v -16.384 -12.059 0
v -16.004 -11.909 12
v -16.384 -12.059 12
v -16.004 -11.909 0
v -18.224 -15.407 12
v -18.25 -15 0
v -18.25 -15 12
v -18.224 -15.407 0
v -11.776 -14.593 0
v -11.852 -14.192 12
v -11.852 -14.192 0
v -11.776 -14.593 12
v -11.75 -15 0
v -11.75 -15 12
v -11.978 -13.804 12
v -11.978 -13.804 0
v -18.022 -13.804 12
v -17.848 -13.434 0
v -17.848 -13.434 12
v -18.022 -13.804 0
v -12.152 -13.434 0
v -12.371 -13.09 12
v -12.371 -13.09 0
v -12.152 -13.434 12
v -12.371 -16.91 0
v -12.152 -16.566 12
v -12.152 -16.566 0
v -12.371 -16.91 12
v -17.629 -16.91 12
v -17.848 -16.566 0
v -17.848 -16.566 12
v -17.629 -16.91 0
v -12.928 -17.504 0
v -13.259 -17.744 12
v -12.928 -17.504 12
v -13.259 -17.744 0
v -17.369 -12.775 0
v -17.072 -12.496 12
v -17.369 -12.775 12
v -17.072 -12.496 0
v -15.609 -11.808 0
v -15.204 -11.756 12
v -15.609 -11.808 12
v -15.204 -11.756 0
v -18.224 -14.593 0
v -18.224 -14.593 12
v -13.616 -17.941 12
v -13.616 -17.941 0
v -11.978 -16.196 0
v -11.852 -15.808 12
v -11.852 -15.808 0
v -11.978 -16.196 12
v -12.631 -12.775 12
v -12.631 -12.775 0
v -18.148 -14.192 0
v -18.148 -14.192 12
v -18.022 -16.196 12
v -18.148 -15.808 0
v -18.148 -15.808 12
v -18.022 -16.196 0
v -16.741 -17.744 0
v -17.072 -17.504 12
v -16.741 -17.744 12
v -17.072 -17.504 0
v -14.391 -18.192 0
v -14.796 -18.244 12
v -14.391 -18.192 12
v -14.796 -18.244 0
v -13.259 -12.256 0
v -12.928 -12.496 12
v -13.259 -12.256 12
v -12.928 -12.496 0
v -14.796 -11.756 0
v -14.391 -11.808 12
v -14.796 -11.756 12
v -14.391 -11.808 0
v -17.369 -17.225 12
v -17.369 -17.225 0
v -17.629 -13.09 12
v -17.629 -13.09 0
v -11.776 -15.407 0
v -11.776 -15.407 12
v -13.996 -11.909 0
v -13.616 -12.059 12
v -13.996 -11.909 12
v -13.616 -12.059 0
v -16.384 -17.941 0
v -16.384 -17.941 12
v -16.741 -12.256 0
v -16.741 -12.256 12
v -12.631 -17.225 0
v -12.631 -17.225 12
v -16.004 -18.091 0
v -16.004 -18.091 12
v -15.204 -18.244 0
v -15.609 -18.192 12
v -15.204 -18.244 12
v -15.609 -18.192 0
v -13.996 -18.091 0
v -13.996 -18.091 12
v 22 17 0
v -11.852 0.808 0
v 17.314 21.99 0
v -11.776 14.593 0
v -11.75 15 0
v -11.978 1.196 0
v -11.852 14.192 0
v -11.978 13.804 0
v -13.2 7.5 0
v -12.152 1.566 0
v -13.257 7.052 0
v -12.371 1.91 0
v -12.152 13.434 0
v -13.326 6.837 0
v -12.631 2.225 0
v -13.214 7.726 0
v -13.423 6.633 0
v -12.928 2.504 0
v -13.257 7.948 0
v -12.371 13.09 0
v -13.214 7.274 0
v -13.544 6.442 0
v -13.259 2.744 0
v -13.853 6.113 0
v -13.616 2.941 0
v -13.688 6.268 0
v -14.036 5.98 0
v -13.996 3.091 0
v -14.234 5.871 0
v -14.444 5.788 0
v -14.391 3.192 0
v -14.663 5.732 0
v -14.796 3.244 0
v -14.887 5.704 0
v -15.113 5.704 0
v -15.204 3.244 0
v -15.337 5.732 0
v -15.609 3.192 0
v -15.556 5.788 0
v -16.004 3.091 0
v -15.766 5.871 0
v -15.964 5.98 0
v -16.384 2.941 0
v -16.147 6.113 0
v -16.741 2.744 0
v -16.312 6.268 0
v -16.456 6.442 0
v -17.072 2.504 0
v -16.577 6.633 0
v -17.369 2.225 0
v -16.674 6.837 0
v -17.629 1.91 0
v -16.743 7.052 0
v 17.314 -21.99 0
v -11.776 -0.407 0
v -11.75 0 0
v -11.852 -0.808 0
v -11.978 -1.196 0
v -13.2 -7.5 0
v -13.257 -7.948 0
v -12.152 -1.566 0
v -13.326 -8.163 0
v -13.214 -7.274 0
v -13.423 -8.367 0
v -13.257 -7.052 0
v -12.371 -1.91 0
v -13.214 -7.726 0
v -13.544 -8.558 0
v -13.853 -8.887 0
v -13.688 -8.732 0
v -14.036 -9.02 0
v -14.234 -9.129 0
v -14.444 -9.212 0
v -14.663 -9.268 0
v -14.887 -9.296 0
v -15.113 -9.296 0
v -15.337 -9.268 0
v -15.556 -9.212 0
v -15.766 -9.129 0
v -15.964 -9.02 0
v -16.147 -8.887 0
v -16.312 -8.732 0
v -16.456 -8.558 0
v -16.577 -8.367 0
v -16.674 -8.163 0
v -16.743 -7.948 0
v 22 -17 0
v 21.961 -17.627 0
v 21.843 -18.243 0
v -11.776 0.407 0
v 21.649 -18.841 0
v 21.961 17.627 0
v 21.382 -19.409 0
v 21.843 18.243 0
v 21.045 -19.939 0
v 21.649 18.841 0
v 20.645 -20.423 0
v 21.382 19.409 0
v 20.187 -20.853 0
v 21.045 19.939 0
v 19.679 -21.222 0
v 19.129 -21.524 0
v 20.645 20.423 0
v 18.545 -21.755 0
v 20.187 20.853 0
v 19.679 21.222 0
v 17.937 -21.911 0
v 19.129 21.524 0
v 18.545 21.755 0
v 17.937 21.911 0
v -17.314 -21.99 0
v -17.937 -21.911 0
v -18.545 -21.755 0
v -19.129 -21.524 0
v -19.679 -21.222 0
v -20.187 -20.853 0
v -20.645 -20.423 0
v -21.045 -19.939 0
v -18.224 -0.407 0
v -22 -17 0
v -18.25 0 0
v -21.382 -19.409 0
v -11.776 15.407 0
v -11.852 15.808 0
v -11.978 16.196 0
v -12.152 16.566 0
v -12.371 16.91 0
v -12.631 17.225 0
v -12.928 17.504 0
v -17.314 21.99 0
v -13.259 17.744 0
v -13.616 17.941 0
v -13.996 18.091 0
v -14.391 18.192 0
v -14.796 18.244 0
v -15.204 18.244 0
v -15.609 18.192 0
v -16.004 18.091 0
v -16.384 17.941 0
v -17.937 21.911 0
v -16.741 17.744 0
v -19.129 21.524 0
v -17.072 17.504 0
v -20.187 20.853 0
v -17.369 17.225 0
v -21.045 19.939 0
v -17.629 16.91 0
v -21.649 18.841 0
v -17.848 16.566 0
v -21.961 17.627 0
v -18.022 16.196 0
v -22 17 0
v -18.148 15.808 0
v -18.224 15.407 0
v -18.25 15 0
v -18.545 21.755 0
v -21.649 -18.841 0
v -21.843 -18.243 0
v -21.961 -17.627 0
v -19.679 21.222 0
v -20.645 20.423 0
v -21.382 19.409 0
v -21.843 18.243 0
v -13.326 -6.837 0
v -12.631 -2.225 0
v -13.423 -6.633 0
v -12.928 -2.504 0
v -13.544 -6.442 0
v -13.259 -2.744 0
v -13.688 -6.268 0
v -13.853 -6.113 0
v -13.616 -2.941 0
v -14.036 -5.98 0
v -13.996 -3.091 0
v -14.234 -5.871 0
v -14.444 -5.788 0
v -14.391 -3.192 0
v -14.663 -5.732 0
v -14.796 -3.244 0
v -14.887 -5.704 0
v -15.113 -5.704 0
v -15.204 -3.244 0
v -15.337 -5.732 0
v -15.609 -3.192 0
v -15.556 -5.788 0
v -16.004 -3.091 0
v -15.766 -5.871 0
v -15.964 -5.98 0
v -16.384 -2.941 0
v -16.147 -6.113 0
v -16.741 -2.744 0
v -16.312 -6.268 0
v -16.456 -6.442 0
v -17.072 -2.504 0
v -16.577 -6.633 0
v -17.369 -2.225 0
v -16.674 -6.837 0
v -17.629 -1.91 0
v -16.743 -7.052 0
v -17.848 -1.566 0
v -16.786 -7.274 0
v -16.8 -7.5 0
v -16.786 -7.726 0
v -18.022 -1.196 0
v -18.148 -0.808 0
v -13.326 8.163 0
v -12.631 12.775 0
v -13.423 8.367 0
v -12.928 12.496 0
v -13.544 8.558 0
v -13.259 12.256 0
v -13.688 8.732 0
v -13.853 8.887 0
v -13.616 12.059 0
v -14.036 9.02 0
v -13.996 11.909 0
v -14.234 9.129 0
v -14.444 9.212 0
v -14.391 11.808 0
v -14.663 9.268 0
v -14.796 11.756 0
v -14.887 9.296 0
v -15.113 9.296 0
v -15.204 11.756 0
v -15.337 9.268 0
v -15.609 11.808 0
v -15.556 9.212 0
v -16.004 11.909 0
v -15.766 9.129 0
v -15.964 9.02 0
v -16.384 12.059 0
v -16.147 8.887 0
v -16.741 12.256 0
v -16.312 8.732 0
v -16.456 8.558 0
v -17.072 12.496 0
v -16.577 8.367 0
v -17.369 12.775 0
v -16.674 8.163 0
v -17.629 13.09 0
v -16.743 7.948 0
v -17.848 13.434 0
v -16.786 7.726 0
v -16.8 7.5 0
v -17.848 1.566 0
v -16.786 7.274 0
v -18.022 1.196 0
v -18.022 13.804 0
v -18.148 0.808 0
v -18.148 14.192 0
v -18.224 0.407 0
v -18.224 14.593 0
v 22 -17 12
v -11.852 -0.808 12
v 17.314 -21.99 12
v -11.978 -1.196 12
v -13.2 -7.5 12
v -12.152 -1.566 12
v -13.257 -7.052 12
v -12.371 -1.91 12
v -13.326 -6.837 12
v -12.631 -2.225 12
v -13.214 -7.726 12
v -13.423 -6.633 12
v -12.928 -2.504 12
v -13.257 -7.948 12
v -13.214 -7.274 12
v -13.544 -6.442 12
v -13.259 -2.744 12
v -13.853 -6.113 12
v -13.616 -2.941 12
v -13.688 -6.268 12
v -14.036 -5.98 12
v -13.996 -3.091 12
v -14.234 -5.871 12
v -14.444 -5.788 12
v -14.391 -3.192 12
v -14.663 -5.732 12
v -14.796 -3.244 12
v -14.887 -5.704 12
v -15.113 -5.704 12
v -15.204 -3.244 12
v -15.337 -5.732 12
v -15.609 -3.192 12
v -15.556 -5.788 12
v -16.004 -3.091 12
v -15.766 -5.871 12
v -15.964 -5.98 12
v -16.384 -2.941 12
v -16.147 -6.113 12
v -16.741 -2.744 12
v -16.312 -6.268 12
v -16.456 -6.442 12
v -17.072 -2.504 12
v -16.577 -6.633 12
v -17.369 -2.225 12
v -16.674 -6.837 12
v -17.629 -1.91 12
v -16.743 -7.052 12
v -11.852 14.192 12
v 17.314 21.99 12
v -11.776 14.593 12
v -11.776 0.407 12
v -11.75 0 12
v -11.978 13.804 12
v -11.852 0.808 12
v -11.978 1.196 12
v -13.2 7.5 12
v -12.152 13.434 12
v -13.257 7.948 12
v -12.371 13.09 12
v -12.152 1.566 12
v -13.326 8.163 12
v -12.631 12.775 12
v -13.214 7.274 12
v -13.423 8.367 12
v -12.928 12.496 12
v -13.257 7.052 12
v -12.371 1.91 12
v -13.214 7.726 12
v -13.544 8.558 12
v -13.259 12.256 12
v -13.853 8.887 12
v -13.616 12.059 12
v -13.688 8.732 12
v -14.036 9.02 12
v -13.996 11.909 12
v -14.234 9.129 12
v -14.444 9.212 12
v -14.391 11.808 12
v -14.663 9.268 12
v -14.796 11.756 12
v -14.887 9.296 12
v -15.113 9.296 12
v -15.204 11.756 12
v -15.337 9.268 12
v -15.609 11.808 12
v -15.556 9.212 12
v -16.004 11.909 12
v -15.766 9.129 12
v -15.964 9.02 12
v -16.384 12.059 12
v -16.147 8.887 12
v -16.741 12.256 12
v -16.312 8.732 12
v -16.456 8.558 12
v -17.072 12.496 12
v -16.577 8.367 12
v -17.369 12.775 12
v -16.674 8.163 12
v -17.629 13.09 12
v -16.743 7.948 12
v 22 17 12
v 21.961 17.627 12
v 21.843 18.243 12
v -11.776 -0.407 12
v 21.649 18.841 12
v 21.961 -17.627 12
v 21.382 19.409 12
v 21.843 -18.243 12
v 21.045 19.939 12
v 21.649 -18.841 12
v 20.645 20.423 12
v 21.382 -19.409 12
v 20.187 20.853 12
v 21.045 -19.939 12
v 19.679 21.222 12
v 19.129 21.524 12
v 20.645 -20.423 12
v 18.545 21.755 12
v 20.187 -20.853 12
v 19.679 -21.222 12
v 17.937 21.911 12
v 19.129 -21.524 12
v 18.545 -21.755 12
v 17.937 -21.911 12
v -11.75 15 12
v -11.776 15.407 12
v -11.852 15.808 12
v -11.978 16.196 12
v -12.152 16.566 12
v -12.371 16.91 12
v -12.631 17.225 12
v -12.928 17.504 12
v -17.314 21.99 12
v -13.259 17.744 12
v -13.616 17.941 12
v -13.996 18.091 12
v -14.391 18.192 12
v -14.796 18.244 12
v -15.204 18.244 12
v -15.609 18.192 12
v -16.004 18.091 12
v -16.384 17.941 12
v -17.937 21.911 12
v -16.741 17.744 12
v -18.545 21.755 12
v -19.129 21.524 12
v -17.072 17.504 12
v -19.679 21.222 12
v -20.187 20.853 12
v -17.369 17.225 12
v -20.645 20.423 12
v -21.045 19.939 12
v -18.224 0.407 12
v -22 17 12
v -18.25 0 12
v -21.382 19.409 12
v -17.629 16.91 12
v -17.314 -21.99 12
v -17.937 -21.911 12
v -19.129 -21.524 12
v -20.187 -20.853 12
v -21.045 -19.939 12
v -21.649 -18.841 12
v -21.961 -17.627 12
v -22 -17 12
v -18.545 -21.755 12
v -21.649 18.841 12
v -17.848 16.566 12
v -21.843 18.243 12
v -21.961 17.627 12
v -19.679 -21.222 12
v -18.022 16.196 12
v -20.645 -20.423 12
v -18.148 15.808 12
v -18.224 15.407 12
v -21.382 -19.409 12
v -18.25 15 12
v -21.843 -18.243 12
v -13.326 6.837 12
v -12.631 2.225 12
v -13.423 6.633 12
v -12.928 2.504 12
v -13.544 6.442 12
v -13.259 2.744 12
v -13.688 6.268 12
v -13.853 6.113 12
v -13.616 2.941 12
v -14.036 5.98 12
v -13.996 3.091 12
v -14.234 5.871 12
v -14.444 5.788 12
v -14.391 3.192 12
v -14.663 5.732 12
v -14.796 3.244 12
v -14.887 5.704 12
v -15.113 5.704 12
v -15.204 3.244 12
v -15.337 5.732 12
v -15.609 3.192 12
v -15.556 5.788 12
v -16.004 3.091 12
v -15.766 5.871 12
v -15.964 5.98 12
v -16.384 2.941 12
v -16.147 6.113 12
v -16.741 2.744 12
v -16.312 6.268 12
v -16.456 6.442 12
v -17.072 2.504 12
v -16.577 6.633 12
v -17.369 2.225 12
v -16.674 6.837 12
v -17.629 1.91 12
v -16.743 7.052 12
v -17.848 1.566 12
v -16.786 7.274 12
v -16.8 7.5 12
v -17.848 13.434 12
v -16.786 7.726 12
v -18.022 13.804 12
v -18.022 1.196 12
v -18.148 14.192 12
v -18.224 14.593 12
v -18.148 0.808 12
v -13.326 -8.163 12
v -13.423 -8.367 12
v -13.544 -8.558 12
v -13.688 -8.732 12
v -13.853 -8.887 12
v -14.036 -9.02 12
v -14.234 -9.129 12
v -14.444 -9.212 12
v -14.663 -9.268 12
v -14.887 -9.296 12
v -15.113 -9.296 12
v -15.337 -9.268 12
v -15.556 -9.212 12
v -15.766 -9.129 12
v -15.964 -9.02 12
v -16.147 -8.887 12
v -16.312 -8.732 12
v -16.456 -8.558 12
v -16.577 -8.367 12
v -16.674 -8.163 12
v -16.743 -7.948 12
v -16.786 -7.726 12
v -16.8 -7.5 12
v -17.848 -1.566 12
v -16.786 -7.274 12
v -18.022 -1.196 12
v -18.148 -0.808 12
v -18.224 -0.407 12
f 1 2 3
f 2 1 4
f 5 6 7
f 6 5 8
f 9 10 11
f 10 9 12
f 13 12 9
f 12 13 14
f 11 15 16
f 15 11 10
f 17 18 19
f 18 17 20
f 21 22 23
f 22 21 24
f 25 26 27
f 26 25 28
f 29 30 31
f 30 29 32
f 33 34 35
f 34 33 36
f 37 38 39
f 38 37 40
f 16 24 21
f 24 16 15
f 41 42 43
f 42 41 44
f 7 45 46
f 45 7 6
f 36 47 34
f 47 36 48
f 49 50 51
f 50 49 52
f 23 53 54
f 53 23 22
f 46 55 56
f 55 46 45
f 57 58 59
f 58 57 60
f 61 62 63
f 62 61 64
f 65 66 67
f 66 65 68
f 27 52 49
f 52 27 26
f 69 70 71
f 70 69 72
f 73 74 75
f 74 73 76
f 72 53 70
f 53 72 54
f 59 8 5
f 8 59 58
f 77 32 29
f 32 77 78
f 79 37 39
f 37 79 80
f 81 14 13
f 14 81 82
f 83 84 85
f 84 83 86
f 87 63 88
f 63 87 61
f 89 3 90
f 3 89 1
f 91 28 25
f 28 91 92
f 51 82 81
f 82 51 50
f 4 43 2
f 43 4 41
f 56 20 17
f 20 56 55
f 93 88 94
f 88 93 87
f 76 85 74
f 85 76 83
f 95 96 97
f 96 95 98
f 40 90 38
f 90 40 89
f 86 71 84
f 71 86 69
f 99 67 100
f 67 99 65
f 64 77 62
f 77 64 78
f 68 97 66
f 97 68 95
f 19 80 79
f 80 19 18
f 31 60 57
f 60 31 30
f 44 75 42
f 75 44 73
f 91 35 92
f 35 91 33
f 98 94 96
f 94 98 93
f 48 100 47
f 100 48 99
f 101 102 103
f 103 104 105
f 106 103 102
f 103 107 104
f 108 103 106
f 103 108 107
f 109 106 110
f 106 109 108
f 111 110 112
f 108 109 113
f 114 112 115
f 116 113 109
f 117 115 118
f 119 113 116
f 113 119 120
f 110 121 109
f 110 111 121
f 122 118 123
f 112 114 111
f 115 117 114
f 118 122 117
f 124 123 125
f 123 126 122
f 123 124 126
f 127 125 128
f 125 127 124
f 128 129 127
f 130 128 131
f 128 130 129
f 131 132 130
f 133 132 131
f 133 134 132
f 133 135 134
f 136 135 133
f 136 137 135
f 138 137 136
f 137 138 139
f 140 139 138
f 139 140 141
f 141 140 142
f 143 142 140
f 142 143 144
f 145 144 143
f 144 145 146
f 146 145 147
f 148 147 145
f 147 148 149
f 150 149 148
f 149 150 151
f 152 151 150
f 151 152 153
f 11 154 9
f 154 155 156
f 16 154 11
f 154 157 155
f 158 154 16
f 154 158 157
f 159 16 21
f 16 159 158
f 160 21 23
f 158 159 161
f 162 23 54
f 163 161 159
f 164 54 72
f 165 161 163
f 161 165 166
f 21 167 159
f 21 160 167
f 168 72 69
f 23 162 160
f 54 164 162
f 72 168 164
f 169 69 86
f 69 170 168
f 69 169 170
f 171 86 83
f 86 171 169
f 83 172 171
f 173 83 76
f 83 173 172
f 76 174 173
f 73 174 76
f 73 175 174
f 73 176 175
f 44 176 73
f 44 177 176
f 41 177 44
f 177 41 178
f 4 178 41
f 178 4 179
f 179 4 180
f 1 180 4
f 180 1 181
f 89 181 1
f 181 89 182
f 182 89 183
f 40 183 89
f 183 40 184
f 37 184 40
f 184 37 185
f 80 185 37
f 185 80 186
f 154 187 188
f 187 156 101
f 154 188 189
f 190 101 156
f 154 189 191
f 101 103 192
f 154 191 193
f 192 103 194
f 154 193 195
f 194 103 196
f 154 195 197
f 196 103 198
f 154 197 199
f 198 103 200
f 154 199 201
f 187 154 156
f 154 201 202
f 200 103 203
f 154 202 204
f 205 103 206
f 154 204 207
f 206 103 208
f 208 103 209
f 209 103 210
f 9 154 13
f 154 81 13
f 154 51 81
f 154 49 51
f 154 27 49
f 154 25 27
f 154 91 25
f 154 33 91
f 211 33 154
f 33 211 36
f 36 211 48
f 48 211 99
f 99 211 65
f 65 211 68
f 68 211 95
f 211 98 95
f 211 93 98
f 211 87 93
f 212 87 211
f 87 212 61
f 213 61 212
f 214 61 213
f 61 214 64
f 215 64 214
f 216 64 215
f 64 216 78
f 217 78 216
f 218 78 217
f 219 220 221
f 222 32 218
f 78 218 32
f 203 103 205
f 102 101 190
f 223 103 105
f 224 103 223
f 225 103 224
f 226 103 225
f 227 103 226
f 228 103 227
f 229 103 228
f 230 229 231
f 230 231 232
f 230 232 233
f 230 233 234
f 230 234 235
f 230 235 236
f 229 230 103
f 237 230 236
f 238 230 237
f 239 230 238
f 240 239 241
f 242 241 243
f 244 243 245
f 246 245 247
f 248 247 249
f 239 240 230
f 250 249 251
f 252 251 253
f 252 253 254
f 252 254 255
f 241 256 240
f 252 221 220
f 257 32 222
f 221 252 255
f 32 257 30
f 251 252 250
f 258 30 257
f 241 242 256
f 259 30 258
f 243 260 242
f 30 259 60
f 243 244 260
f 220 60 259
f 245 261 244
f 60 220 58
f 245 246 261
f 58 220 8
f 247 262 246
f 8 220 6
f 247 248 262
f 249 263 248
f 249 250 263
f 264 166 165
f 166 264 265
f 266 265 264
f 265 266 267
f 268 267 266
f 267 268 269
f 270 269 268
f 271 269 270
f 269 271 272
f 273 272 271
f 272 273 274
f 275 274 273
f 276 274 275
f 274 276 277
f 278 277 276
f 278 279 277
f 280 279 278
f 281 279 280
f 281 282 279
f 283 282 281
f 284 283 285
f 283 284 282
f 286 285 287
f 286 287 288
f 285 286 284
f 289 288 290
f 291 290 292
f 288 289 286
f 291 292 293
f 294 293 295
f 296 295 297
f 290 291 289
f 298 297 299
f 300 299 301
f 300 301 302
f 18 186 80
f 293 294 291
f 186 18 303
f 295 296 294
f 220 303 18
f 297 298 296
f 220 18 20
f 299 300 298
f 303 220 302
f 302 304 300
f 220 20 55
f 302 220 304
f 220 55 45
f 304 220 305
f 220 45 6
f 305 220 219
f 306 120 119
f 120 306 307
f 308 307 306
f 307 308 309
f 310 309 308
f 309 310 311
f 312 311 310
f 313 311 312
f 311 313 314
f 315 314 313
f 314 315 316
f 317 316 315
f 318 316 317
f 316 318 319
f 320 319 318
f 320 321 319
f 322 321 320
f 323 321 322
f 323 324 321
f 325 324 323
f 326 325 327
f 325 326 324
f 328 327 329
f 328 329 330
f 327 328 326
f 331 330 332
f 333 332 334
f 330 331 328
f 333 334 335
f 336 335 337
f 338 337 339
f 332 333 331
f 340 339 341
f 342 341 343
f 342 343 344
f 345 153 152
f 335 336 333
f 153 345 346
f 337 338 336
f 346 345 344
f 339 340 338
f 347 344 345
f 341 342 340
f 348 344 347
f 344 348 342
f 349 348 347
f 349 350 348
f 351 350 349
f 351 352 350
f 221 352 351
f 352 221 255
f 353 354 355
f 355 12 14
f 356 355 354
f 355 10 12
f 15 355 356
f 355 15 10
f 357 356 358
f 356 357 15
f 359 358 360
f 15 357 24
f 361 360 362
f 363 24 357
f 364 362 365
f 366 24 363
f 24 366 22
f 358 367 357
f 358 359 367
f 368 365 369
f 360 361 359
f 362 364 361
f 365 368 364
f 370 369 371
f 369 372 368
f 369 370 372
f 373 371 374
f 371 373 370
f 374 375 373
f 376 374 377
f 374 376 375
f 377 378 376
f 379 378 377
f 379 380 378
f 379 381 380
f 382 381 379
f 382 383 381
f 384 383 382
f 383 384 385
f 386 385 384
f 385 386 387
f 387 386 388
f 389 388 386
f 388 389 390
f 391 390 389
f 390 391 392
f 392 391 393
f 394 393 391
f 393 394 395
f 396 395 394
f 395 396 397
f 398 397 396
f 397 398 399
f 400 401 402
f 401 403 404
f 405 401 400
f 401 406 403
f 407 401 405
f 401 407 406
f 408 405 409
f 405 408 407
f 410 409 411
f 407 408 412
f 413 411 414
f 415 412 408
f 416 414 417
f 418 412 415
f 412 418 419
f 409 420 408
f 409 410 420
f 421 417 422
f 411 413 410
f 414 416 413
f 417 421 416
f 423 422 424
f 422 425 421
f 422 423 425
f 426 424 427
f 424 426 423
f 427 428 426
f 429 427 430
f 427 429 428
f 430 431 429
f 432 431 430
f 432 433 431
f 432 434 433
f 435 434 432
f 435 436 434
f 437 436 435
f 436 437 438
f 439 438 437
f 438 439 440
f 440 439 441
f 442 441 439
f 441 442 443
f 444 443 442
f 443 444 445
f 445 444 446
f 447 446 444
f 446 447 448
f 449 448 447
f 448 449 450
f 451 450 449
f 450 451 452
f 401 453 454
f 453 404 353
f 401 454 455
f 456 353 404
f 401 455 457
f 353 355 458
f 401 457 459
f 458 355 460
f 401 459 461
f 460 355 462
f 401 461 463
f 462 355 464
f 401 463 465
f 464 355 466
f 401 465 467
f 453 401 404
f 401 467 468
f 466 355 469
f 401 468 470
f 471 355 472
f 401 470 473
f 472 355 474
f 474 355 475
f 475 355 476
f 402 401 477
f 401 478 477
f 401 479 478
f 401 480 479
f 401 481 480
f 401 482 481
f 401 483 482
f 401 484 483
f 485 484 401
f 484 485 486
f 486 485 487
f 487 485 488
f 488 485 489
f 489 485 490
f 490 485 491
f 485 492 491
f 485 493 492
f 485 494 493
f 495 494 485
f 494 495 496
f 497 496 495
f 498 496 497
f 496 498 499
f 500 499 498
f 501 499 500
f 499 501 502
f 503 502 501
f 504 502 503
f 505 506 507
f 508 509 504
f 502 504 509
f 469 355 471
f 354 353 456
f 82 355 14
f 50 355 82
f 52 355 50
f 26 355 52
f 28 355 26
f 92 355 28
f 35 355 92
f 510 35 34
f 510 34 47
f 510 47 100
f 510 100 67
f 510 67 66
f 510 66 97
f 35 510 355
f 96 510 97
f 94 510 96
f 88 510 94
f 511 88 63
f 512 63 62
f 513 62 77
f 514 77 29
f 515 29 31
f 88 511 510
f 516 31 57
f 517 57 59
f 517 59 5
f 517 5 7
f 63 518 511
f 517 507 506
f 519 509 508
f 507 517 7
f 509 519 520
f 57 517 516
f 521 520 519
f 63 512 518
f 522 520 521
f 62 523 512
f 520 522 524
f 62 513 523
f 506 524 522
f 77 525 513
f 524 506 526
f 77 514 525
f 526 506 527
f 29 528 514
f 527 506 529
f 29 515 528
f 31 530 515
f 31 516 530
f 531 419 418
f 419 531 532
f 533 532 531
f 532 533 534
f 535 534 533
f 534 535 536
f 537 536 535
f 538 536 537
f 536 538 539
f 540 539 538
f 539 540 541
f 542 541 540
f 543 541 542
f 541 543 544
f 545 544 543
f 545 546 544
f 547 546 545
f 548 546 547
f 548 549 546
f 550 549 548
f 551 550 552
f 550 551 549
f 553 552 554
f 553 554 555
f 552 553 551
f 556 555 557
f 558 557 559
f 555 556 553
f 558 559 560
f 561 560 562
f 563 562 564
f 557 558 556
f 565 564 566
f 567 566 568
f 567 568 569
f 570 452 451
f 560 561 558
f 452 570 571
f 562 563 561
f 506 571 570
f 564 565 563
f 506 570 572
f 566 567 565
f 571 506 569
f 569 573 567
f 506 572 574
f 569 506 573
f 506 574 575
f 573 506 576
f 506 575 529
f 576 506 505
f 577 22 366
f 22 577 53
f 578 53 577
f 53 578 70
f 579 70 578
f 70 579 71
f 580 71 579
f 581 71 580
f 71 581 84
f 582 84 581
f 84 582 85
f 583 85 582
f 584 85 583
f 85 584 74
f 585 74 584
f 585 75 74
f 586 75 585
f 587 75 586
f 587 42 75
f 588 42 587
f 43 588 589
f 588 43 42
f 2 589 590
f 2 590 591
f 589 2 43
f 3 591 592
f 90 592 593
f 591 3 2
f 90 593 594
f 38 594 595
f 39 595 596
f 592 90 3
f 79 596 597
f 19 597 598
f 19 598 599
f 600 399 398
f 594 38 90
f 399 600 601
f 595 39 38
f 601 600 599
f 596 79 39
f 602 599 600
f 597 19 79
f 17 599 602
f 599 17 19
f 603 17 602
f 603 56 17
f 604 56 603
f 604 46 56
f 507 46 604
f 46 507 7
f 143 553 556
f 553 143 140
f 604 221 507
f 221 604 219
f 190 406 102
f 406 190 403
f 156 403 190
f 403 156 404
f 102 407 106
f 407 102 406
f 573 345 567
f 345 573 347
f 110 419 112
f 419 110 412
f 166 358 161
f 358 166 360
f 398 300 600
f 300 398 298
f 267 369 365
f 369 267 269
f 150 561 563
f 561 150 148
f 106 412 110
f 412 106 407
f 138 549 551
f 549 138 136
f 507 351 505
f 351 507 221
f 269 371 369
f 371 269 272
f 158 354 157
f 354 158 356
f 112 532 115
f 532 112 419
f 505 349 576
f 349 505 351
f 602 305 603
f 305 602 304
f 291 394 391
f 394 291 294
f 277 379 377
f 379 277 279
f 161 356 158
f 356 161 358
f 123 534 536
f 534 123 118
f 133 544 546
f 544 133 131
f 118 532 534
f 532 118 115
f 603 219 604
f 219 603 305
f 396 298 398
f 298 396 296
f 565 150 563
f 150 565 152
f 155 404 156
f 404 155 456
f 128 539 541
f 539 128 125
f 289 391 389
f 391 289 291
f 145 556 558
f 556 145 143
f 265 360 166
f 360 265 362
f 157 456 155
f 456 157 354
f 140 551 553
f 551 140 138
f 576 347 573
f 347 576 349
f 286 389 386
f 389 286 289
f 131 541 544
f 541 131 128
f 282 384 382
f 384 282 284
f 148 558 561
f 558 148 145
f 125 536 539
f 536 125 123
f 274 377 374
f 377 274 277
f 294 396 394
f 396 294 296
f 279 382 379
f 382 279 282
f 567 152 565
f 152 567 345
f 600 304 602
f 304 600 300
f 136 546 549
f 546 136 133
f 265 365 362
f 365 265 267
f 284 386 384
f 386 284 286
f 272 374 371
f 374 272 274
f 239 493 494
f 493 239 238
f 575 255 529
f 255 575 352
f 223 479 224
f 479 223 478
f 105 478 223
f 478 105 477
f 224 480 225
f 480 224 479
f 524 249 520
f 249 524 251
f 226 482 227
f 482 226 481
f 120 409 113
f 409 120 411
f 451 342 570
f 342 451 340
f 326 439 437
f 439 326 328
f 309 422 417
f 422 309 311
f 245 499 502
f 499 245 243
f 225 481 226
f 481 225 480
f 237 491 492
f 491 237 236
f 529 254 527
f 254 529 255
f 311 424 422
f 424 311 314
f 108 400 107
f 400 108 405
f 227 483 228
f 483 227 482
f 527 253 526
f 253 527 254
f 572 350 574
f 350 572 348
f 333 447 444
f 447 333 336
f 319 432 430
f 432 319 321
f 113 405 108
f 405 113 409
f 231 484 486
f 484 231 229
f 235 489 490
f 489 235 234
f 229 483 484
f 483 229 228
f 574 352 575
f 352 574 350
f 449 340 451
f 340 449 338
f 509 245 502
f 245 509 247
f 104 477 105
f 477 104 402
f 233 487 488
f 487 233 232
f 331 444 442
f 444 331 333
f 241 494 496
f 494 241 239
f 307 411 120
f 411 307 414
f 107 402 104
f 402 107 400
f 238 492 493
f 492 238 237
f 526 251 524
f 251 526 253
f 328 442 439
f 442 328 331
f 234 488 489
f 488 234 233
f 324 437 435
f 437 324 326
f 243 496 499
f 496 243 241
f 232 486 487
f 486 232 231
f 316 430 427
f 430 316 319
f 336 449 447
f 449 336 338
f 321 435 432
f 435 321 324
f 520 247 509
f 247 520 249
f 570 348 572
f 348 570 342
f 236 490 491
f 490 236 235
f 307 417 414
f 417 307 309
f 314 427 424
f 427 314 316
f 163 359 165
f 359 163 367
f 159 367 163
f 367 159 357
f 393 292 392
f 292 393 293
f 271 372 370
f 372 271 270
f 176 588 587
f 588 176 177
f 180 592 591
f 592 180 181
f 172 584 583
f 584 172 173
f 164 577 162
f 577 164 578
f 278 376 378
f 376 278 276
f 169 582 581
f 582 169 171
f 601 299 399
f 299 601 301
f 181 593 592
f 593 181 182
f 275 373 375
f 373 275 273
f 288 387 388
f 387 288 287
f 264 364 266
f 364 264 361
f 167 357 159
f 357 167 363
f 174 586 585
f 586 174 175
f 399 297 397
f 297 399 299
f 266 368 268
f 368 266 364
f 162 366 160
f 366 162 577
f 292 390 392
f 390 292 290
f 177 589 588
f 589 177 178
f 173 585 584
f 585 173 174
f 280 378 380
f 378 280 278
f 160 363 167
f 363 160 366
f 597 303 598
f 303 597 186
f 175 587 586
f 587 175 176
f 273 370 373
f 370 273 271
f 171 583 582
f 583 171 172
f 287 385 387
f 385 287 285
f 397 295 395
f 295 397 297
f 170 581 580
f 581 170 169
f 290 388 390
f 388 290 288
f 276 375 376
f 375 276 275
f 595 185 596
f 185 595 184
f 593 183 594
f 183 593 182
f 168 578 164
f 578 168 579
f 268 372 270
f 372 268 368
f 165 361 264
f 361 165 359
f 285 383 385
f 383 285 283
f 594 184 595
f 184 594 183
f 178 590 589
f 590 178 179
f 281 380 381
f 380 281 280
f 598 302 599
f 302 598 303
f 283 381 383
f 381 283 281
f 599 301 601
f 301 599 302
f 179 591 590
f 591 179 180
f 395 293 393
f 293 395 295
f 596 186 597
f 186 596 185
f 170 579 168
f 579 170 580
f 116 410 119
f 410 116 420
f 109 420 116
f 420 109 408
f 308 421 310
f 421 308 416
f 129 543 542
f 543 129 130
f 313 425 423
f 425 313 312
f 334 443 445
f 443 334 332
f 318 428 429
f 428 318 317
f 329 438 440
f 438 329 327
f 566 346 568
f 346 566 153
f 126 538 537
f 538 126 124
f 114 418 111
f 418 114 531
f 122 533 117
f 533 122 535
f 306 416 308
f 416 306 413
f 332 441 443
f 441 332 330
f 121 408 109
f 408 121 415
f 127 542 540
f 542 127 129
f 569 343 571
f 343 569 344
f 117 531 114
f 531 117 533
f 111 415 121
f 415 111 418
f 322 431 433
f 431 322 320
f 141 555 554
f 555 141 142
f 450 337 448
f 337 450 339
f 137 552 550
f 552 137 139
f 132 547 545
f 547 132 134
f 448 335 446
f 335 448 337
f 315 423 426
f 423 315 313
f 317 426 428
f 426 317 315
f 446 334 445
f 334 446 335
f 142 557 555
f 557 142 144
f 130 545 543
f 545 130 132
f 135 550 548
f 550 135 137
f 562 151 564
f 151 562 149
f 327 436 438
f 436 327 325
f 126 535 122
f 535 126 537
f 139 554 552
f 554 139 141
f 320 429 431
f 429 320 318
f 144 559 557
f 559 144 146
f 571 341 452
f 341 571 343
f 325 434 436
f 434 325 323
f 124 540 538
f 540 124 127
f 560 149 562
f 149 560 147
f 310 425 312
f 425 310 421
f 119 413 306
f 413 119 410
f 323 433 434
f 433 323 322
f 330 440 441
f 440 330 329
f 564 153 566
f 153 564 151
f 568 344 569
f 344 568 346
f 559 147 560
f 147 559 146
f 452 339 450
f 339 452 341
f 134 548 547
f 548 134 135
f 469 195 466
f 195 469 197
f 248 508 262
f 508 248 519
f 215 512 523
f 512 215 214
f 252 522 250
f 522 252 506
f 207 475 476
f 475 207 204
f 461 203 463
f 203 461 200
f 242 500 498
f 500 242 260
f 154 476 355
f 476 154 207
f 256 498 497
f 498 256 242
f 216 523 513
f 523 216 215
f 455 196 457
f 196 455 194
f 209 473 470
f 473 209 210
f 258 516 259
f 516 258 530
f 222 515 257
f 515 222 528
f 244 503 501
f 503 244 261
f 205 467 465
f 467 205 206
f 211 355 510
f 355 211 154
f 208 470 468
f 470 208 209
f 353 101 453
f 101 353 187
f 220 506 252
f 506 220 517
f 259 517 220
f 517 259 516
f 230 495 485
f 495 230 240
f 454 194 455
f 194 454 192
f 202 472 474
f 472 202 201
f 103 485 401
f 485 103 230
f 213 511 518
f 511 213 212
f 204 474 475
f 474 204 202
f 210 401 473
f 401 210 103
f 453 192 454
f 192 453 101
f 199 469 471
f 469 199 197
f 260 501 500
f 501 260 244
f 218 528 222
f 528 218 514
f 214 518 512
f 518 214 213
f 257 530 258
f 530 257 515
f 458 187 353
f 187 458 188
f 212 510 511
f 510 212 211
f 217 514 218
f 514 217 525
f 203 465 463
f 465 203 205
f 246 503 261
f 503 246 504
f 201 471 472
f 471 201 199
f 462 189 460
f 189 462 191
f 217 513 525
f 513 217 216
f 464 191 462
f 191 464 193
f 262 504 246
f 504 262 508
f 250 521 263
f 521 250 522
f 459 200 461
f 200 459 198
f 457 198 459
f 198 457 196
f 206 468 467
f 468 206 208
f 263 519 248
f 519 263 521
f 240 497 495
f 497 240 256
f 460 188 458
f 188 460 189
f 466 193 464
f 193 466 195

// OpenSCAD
$fn = 50;


difference() {
	union() {
		hull() {
			translate(v = [-17.0000000000, 17.0000000000, 0]) {
				cylinder(h = 12, r = 5);
			}
			translate(v = [17.0000000000, 17.0000000000, 0]) {
				cylinder(h = 12, r = 5);
			}
			translate(v = [-17.0000000000, -17.0000000000, 0]) {
				cylinder(h = 12, r = 5);
			}
			translate(v = [17.0000000000, -17.0000000000, 0]) {
				cylinder(h = 12, r = 5);
			}
		}
	}
	union() {
		translate(v = [-15.0000000000, -15.0000000000, 0]) {
			cylinder(h = 12, r = 3.2500000000);
		}
		translate(v = [-15.0000000000, 0.0000000000, 0]) {
			cylinder(h = 12, r = 3.2500000000);
		}
		translate(v = [-15.0000000000, 15.0000000000, 0]) {
			cylinder(h = 12, r = 3.2500000000);
		}
		translate(v = [-15.0000000000, -15.0000000000, 0]) {
			cylinder(h = 12, r = 1.8000000000);
		}
		translate(v = [-15.0000000000, -7.5000000000, 0]) {
			cylinder(h = 12, r = 1.8000000000);
		}
		translate(v = [-15.0000000000, 0.0000000000, 0]) {
			cylinder(h = 12, r = 1.8000000000);
		}
		translate(v = [-15.0000000000, 7.5000000000, 0]) {
			cylinder(h = 12, r = 1.8000000000);
		}
		translate(v = [-15.0000000000, 15.0000000000, 0]) {
			cylinder(h = 12, r = 1.8000000000);
		}
		translate(v = [-15.0000000000, -15.0000000000, 0]) {
			cylinder(h = 12, r = 1.8000000000);
		}
		translate(v = [-15.0000000000, -7.5000000000, 0]) {
			cylinder(h = 12, r = 1.8000000000);
		}
		translate(v = [-15.0000000000, 0.0000000000, 0]) {
			cylinder(h = 12, r = 1.8000000000);
		}
		translate(v = [-15.0000000000, 7.5000000000, 0]) {
			cylinder(h = 12, r = 1.8000000000);
		}
		translate(v = [-15.0000000000, 15.0000000000, 0]) {
			cylinder(h = 12, r = 1.8000000000);
		}
		translate(v = [-15.0000000000, -15.0000000000, 0]) {
			cylinder(h = 12, r = 1.8000000000);
		}
		translate(v = [-15.0000000000, -7.5000000000, 0]) {
			cylinder(h = 12, r = 1.8000000000);
		}
		translate(v = [-15.0000000000, 0.0000000000, 0]) {
			cylinder(h = 12, r = 1.8000000000);
		}
		translate(v = [-15.0000000000, 7.5000000000, 0]) {
			cylinder(h = 12, r = 1.8000000000);
		}
		translate(v = [-15.0000000000, 15.0000000000, 0]) {
			cylinder(h = 12, r = 1.8000000000);
		}
	}
}
